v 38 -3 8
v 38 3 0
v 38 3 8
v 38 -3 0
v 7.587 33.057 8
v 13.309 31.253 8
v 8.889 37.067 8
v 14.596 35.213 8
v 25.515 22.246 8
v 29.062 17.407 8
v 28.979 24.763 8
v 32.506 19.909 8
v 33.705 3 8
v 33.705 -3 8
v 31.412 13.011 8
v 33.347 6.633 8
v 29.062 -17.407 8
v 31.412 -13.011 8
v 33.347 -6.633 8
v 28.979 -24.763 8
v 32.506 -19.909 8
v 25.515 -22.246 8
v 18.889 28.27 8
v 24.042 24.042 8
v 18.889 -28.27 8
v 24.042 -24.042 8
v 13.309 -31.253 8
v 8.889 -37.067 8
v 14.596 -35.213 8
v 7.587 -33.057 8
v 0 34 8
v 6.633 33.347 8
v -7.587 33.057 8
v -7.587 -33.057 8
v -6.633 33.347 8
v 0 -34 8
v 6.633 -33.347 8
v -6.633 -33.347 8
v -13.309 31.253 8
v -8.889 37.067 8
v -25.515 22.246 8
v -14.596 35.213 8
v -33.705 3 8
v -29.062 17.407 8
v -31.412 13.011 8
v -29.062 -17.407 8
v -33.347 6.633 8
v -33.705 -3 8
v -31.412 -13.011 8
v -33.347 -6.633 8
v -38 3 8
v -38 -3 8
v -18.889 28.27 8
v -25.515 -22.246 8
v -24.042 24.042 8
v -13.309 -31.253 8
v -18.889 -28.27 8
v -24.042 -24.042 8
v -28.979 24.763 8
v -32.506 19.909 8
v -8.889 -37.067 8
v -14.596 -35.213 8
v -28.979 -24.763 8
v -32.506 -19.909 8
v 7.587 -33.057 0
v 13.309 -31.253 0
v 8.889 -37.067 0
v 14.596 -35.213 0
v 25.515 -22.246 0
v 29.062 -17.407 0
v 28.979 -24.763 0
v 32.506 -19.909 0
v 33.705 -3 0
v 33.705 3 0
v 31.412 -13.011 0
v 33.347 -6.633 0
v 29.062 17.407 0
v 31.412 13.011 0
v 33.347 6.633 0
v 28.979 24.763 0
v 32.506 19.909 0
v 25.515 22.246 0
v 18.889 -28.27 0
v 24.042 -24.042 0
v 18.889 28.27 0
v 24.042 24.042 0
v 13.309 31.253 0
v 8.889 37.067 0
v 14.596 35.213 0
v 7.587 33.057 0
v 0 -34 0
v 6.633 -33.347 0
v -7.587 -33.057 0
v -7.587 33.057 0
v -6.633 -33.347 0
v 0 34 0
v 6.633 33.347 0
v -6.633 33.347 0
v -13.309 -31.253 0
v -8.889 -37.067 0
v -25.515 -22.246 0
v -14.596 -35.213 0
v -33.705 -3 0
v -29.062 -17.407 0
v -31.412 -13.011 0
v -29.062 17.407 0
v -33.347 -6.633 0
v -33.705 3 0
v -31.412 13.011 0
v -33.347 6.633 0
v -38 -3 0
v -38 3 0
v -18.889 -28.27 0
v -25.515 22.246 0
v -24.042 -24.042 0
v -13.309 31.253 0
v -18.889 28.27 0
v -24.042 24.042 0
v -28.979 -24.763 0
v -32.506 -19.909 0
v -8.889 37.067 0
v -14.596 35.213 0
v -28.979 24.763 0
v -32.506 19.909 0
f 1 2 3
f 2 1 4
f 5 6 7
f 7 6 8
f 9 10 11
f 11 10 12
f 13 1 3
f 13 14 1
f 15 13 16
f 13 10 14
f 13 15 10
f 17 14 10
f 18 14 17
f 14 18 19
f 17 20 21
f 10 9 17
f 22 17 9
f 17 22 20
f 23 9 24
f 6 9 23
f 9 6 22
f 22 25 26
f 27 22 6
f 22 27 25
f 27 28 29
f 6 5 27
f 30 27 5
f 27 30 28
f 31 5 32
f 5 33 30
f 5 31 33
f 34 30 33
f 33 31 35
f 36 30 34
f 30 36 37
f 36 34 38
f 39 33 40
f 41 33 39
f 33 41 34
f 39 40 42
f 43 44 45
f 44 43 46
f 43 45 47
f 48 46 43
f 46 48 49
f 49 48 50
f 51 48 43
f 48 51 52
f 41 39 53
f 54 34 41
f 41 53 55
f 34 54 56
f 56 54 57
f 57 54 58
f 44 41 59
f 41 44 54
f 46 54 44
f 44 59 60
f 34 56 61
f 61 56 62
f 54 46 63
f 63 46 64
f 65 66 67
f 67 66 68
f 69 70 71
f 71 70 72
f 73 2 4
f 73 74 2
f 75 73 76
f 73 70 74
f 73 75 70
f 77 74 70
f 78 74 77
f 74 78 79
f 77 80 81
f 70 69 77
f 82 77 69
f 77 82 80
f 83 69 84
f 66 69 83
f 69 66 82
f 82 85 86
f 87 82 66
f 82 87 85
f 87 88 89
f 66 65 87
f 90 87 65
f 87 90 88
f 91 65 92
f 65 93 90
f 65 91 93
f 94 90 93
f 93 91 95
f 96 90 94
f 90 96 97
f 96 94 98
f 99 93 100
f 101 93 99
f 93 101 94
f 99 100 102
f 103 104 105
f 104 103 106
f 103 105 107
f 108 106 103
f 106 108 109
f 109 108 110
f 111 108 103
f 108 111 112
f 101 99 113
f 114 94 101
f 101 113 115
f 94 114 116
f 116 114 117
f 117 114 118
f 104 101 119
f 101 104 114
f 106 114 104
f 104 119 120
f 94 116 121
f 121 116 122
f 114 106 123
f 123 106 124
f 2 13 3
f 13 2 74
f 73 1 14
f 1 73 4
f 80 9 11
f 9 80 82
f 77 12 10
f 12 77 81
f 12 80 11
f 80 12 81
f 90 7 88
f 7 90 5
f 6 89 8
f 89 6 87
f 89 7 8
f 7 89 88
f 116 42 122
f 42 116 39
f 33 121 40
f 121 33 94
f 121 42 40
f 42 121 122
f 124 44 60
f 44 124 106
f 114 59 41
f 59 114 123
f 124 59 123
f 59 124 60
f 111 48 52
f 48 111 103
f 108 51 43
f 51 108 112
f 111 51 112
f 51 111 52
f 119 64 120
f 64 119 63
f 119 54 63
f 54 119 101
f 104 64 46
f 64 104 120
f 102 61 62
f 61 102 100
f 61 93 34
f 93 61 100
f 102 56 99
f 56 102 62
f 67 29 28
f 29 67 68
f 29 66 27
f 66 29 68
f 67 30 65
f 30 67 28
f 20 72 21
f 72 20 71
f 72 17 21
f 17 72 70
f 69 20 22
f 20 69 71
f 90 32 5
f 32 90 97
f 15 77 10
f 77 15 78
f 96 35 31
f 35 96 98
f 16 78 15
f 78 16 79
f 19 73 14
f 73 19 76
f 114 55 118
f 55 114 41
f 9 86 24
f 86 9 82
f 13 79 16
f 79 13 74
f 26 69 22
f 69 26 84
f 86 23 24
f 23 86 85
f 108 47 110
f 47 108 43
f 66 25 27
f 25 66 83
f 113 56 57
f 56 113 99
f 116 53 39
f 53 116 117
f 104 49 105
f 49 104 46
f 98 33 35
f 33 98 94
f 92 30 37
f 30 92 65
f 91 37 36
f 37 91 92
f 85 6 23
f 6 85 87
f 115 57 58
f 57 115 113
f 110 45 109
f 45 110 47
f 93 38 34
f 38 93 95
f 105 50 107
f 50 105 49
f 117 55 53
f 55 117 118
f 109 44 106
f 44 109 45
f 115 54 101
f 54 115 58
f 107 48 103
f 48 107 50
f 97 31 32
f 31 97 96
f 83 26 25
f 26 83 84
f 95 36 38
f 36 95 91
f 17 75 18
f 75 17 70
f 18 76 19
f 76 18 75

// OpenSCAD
$fn = 32;

// ----------------------------------------------------------------------
// Spur blank: plain gear blank
// ----------------------------------------------------------------------

// --- parameters (mm) ---
disc_r = 34;              // blank root radius
disc_t = 8;               // blank thickness
n_teeth = 10;             // stub tooth count
tooth_w = 6;              // tooth width at the root
tooth_h = 4;              // tooth height above the root
fit_tol = 0.02;           // tolerance for press fits, mm
free_tol = 0.2;           // tolerance for clearance fits, mm

out_r = disc_r + tooth_h;  // tip radius
bbox_x = 76.0;  // measured width over the teeth
bbox_y = 74.13;  // measured depth over the teeth

union() {
  cylinder(r = disc_r, h = disc_t);
  for (i = [0 : n_teeth - 1])
    rotate([0, 0, i * 360 / n_teeth])
      translate([disc_r - 1, -tooth_w / 2, 0])
        cube([tooth_h + 1, tooth_w, disc_t]);
}
